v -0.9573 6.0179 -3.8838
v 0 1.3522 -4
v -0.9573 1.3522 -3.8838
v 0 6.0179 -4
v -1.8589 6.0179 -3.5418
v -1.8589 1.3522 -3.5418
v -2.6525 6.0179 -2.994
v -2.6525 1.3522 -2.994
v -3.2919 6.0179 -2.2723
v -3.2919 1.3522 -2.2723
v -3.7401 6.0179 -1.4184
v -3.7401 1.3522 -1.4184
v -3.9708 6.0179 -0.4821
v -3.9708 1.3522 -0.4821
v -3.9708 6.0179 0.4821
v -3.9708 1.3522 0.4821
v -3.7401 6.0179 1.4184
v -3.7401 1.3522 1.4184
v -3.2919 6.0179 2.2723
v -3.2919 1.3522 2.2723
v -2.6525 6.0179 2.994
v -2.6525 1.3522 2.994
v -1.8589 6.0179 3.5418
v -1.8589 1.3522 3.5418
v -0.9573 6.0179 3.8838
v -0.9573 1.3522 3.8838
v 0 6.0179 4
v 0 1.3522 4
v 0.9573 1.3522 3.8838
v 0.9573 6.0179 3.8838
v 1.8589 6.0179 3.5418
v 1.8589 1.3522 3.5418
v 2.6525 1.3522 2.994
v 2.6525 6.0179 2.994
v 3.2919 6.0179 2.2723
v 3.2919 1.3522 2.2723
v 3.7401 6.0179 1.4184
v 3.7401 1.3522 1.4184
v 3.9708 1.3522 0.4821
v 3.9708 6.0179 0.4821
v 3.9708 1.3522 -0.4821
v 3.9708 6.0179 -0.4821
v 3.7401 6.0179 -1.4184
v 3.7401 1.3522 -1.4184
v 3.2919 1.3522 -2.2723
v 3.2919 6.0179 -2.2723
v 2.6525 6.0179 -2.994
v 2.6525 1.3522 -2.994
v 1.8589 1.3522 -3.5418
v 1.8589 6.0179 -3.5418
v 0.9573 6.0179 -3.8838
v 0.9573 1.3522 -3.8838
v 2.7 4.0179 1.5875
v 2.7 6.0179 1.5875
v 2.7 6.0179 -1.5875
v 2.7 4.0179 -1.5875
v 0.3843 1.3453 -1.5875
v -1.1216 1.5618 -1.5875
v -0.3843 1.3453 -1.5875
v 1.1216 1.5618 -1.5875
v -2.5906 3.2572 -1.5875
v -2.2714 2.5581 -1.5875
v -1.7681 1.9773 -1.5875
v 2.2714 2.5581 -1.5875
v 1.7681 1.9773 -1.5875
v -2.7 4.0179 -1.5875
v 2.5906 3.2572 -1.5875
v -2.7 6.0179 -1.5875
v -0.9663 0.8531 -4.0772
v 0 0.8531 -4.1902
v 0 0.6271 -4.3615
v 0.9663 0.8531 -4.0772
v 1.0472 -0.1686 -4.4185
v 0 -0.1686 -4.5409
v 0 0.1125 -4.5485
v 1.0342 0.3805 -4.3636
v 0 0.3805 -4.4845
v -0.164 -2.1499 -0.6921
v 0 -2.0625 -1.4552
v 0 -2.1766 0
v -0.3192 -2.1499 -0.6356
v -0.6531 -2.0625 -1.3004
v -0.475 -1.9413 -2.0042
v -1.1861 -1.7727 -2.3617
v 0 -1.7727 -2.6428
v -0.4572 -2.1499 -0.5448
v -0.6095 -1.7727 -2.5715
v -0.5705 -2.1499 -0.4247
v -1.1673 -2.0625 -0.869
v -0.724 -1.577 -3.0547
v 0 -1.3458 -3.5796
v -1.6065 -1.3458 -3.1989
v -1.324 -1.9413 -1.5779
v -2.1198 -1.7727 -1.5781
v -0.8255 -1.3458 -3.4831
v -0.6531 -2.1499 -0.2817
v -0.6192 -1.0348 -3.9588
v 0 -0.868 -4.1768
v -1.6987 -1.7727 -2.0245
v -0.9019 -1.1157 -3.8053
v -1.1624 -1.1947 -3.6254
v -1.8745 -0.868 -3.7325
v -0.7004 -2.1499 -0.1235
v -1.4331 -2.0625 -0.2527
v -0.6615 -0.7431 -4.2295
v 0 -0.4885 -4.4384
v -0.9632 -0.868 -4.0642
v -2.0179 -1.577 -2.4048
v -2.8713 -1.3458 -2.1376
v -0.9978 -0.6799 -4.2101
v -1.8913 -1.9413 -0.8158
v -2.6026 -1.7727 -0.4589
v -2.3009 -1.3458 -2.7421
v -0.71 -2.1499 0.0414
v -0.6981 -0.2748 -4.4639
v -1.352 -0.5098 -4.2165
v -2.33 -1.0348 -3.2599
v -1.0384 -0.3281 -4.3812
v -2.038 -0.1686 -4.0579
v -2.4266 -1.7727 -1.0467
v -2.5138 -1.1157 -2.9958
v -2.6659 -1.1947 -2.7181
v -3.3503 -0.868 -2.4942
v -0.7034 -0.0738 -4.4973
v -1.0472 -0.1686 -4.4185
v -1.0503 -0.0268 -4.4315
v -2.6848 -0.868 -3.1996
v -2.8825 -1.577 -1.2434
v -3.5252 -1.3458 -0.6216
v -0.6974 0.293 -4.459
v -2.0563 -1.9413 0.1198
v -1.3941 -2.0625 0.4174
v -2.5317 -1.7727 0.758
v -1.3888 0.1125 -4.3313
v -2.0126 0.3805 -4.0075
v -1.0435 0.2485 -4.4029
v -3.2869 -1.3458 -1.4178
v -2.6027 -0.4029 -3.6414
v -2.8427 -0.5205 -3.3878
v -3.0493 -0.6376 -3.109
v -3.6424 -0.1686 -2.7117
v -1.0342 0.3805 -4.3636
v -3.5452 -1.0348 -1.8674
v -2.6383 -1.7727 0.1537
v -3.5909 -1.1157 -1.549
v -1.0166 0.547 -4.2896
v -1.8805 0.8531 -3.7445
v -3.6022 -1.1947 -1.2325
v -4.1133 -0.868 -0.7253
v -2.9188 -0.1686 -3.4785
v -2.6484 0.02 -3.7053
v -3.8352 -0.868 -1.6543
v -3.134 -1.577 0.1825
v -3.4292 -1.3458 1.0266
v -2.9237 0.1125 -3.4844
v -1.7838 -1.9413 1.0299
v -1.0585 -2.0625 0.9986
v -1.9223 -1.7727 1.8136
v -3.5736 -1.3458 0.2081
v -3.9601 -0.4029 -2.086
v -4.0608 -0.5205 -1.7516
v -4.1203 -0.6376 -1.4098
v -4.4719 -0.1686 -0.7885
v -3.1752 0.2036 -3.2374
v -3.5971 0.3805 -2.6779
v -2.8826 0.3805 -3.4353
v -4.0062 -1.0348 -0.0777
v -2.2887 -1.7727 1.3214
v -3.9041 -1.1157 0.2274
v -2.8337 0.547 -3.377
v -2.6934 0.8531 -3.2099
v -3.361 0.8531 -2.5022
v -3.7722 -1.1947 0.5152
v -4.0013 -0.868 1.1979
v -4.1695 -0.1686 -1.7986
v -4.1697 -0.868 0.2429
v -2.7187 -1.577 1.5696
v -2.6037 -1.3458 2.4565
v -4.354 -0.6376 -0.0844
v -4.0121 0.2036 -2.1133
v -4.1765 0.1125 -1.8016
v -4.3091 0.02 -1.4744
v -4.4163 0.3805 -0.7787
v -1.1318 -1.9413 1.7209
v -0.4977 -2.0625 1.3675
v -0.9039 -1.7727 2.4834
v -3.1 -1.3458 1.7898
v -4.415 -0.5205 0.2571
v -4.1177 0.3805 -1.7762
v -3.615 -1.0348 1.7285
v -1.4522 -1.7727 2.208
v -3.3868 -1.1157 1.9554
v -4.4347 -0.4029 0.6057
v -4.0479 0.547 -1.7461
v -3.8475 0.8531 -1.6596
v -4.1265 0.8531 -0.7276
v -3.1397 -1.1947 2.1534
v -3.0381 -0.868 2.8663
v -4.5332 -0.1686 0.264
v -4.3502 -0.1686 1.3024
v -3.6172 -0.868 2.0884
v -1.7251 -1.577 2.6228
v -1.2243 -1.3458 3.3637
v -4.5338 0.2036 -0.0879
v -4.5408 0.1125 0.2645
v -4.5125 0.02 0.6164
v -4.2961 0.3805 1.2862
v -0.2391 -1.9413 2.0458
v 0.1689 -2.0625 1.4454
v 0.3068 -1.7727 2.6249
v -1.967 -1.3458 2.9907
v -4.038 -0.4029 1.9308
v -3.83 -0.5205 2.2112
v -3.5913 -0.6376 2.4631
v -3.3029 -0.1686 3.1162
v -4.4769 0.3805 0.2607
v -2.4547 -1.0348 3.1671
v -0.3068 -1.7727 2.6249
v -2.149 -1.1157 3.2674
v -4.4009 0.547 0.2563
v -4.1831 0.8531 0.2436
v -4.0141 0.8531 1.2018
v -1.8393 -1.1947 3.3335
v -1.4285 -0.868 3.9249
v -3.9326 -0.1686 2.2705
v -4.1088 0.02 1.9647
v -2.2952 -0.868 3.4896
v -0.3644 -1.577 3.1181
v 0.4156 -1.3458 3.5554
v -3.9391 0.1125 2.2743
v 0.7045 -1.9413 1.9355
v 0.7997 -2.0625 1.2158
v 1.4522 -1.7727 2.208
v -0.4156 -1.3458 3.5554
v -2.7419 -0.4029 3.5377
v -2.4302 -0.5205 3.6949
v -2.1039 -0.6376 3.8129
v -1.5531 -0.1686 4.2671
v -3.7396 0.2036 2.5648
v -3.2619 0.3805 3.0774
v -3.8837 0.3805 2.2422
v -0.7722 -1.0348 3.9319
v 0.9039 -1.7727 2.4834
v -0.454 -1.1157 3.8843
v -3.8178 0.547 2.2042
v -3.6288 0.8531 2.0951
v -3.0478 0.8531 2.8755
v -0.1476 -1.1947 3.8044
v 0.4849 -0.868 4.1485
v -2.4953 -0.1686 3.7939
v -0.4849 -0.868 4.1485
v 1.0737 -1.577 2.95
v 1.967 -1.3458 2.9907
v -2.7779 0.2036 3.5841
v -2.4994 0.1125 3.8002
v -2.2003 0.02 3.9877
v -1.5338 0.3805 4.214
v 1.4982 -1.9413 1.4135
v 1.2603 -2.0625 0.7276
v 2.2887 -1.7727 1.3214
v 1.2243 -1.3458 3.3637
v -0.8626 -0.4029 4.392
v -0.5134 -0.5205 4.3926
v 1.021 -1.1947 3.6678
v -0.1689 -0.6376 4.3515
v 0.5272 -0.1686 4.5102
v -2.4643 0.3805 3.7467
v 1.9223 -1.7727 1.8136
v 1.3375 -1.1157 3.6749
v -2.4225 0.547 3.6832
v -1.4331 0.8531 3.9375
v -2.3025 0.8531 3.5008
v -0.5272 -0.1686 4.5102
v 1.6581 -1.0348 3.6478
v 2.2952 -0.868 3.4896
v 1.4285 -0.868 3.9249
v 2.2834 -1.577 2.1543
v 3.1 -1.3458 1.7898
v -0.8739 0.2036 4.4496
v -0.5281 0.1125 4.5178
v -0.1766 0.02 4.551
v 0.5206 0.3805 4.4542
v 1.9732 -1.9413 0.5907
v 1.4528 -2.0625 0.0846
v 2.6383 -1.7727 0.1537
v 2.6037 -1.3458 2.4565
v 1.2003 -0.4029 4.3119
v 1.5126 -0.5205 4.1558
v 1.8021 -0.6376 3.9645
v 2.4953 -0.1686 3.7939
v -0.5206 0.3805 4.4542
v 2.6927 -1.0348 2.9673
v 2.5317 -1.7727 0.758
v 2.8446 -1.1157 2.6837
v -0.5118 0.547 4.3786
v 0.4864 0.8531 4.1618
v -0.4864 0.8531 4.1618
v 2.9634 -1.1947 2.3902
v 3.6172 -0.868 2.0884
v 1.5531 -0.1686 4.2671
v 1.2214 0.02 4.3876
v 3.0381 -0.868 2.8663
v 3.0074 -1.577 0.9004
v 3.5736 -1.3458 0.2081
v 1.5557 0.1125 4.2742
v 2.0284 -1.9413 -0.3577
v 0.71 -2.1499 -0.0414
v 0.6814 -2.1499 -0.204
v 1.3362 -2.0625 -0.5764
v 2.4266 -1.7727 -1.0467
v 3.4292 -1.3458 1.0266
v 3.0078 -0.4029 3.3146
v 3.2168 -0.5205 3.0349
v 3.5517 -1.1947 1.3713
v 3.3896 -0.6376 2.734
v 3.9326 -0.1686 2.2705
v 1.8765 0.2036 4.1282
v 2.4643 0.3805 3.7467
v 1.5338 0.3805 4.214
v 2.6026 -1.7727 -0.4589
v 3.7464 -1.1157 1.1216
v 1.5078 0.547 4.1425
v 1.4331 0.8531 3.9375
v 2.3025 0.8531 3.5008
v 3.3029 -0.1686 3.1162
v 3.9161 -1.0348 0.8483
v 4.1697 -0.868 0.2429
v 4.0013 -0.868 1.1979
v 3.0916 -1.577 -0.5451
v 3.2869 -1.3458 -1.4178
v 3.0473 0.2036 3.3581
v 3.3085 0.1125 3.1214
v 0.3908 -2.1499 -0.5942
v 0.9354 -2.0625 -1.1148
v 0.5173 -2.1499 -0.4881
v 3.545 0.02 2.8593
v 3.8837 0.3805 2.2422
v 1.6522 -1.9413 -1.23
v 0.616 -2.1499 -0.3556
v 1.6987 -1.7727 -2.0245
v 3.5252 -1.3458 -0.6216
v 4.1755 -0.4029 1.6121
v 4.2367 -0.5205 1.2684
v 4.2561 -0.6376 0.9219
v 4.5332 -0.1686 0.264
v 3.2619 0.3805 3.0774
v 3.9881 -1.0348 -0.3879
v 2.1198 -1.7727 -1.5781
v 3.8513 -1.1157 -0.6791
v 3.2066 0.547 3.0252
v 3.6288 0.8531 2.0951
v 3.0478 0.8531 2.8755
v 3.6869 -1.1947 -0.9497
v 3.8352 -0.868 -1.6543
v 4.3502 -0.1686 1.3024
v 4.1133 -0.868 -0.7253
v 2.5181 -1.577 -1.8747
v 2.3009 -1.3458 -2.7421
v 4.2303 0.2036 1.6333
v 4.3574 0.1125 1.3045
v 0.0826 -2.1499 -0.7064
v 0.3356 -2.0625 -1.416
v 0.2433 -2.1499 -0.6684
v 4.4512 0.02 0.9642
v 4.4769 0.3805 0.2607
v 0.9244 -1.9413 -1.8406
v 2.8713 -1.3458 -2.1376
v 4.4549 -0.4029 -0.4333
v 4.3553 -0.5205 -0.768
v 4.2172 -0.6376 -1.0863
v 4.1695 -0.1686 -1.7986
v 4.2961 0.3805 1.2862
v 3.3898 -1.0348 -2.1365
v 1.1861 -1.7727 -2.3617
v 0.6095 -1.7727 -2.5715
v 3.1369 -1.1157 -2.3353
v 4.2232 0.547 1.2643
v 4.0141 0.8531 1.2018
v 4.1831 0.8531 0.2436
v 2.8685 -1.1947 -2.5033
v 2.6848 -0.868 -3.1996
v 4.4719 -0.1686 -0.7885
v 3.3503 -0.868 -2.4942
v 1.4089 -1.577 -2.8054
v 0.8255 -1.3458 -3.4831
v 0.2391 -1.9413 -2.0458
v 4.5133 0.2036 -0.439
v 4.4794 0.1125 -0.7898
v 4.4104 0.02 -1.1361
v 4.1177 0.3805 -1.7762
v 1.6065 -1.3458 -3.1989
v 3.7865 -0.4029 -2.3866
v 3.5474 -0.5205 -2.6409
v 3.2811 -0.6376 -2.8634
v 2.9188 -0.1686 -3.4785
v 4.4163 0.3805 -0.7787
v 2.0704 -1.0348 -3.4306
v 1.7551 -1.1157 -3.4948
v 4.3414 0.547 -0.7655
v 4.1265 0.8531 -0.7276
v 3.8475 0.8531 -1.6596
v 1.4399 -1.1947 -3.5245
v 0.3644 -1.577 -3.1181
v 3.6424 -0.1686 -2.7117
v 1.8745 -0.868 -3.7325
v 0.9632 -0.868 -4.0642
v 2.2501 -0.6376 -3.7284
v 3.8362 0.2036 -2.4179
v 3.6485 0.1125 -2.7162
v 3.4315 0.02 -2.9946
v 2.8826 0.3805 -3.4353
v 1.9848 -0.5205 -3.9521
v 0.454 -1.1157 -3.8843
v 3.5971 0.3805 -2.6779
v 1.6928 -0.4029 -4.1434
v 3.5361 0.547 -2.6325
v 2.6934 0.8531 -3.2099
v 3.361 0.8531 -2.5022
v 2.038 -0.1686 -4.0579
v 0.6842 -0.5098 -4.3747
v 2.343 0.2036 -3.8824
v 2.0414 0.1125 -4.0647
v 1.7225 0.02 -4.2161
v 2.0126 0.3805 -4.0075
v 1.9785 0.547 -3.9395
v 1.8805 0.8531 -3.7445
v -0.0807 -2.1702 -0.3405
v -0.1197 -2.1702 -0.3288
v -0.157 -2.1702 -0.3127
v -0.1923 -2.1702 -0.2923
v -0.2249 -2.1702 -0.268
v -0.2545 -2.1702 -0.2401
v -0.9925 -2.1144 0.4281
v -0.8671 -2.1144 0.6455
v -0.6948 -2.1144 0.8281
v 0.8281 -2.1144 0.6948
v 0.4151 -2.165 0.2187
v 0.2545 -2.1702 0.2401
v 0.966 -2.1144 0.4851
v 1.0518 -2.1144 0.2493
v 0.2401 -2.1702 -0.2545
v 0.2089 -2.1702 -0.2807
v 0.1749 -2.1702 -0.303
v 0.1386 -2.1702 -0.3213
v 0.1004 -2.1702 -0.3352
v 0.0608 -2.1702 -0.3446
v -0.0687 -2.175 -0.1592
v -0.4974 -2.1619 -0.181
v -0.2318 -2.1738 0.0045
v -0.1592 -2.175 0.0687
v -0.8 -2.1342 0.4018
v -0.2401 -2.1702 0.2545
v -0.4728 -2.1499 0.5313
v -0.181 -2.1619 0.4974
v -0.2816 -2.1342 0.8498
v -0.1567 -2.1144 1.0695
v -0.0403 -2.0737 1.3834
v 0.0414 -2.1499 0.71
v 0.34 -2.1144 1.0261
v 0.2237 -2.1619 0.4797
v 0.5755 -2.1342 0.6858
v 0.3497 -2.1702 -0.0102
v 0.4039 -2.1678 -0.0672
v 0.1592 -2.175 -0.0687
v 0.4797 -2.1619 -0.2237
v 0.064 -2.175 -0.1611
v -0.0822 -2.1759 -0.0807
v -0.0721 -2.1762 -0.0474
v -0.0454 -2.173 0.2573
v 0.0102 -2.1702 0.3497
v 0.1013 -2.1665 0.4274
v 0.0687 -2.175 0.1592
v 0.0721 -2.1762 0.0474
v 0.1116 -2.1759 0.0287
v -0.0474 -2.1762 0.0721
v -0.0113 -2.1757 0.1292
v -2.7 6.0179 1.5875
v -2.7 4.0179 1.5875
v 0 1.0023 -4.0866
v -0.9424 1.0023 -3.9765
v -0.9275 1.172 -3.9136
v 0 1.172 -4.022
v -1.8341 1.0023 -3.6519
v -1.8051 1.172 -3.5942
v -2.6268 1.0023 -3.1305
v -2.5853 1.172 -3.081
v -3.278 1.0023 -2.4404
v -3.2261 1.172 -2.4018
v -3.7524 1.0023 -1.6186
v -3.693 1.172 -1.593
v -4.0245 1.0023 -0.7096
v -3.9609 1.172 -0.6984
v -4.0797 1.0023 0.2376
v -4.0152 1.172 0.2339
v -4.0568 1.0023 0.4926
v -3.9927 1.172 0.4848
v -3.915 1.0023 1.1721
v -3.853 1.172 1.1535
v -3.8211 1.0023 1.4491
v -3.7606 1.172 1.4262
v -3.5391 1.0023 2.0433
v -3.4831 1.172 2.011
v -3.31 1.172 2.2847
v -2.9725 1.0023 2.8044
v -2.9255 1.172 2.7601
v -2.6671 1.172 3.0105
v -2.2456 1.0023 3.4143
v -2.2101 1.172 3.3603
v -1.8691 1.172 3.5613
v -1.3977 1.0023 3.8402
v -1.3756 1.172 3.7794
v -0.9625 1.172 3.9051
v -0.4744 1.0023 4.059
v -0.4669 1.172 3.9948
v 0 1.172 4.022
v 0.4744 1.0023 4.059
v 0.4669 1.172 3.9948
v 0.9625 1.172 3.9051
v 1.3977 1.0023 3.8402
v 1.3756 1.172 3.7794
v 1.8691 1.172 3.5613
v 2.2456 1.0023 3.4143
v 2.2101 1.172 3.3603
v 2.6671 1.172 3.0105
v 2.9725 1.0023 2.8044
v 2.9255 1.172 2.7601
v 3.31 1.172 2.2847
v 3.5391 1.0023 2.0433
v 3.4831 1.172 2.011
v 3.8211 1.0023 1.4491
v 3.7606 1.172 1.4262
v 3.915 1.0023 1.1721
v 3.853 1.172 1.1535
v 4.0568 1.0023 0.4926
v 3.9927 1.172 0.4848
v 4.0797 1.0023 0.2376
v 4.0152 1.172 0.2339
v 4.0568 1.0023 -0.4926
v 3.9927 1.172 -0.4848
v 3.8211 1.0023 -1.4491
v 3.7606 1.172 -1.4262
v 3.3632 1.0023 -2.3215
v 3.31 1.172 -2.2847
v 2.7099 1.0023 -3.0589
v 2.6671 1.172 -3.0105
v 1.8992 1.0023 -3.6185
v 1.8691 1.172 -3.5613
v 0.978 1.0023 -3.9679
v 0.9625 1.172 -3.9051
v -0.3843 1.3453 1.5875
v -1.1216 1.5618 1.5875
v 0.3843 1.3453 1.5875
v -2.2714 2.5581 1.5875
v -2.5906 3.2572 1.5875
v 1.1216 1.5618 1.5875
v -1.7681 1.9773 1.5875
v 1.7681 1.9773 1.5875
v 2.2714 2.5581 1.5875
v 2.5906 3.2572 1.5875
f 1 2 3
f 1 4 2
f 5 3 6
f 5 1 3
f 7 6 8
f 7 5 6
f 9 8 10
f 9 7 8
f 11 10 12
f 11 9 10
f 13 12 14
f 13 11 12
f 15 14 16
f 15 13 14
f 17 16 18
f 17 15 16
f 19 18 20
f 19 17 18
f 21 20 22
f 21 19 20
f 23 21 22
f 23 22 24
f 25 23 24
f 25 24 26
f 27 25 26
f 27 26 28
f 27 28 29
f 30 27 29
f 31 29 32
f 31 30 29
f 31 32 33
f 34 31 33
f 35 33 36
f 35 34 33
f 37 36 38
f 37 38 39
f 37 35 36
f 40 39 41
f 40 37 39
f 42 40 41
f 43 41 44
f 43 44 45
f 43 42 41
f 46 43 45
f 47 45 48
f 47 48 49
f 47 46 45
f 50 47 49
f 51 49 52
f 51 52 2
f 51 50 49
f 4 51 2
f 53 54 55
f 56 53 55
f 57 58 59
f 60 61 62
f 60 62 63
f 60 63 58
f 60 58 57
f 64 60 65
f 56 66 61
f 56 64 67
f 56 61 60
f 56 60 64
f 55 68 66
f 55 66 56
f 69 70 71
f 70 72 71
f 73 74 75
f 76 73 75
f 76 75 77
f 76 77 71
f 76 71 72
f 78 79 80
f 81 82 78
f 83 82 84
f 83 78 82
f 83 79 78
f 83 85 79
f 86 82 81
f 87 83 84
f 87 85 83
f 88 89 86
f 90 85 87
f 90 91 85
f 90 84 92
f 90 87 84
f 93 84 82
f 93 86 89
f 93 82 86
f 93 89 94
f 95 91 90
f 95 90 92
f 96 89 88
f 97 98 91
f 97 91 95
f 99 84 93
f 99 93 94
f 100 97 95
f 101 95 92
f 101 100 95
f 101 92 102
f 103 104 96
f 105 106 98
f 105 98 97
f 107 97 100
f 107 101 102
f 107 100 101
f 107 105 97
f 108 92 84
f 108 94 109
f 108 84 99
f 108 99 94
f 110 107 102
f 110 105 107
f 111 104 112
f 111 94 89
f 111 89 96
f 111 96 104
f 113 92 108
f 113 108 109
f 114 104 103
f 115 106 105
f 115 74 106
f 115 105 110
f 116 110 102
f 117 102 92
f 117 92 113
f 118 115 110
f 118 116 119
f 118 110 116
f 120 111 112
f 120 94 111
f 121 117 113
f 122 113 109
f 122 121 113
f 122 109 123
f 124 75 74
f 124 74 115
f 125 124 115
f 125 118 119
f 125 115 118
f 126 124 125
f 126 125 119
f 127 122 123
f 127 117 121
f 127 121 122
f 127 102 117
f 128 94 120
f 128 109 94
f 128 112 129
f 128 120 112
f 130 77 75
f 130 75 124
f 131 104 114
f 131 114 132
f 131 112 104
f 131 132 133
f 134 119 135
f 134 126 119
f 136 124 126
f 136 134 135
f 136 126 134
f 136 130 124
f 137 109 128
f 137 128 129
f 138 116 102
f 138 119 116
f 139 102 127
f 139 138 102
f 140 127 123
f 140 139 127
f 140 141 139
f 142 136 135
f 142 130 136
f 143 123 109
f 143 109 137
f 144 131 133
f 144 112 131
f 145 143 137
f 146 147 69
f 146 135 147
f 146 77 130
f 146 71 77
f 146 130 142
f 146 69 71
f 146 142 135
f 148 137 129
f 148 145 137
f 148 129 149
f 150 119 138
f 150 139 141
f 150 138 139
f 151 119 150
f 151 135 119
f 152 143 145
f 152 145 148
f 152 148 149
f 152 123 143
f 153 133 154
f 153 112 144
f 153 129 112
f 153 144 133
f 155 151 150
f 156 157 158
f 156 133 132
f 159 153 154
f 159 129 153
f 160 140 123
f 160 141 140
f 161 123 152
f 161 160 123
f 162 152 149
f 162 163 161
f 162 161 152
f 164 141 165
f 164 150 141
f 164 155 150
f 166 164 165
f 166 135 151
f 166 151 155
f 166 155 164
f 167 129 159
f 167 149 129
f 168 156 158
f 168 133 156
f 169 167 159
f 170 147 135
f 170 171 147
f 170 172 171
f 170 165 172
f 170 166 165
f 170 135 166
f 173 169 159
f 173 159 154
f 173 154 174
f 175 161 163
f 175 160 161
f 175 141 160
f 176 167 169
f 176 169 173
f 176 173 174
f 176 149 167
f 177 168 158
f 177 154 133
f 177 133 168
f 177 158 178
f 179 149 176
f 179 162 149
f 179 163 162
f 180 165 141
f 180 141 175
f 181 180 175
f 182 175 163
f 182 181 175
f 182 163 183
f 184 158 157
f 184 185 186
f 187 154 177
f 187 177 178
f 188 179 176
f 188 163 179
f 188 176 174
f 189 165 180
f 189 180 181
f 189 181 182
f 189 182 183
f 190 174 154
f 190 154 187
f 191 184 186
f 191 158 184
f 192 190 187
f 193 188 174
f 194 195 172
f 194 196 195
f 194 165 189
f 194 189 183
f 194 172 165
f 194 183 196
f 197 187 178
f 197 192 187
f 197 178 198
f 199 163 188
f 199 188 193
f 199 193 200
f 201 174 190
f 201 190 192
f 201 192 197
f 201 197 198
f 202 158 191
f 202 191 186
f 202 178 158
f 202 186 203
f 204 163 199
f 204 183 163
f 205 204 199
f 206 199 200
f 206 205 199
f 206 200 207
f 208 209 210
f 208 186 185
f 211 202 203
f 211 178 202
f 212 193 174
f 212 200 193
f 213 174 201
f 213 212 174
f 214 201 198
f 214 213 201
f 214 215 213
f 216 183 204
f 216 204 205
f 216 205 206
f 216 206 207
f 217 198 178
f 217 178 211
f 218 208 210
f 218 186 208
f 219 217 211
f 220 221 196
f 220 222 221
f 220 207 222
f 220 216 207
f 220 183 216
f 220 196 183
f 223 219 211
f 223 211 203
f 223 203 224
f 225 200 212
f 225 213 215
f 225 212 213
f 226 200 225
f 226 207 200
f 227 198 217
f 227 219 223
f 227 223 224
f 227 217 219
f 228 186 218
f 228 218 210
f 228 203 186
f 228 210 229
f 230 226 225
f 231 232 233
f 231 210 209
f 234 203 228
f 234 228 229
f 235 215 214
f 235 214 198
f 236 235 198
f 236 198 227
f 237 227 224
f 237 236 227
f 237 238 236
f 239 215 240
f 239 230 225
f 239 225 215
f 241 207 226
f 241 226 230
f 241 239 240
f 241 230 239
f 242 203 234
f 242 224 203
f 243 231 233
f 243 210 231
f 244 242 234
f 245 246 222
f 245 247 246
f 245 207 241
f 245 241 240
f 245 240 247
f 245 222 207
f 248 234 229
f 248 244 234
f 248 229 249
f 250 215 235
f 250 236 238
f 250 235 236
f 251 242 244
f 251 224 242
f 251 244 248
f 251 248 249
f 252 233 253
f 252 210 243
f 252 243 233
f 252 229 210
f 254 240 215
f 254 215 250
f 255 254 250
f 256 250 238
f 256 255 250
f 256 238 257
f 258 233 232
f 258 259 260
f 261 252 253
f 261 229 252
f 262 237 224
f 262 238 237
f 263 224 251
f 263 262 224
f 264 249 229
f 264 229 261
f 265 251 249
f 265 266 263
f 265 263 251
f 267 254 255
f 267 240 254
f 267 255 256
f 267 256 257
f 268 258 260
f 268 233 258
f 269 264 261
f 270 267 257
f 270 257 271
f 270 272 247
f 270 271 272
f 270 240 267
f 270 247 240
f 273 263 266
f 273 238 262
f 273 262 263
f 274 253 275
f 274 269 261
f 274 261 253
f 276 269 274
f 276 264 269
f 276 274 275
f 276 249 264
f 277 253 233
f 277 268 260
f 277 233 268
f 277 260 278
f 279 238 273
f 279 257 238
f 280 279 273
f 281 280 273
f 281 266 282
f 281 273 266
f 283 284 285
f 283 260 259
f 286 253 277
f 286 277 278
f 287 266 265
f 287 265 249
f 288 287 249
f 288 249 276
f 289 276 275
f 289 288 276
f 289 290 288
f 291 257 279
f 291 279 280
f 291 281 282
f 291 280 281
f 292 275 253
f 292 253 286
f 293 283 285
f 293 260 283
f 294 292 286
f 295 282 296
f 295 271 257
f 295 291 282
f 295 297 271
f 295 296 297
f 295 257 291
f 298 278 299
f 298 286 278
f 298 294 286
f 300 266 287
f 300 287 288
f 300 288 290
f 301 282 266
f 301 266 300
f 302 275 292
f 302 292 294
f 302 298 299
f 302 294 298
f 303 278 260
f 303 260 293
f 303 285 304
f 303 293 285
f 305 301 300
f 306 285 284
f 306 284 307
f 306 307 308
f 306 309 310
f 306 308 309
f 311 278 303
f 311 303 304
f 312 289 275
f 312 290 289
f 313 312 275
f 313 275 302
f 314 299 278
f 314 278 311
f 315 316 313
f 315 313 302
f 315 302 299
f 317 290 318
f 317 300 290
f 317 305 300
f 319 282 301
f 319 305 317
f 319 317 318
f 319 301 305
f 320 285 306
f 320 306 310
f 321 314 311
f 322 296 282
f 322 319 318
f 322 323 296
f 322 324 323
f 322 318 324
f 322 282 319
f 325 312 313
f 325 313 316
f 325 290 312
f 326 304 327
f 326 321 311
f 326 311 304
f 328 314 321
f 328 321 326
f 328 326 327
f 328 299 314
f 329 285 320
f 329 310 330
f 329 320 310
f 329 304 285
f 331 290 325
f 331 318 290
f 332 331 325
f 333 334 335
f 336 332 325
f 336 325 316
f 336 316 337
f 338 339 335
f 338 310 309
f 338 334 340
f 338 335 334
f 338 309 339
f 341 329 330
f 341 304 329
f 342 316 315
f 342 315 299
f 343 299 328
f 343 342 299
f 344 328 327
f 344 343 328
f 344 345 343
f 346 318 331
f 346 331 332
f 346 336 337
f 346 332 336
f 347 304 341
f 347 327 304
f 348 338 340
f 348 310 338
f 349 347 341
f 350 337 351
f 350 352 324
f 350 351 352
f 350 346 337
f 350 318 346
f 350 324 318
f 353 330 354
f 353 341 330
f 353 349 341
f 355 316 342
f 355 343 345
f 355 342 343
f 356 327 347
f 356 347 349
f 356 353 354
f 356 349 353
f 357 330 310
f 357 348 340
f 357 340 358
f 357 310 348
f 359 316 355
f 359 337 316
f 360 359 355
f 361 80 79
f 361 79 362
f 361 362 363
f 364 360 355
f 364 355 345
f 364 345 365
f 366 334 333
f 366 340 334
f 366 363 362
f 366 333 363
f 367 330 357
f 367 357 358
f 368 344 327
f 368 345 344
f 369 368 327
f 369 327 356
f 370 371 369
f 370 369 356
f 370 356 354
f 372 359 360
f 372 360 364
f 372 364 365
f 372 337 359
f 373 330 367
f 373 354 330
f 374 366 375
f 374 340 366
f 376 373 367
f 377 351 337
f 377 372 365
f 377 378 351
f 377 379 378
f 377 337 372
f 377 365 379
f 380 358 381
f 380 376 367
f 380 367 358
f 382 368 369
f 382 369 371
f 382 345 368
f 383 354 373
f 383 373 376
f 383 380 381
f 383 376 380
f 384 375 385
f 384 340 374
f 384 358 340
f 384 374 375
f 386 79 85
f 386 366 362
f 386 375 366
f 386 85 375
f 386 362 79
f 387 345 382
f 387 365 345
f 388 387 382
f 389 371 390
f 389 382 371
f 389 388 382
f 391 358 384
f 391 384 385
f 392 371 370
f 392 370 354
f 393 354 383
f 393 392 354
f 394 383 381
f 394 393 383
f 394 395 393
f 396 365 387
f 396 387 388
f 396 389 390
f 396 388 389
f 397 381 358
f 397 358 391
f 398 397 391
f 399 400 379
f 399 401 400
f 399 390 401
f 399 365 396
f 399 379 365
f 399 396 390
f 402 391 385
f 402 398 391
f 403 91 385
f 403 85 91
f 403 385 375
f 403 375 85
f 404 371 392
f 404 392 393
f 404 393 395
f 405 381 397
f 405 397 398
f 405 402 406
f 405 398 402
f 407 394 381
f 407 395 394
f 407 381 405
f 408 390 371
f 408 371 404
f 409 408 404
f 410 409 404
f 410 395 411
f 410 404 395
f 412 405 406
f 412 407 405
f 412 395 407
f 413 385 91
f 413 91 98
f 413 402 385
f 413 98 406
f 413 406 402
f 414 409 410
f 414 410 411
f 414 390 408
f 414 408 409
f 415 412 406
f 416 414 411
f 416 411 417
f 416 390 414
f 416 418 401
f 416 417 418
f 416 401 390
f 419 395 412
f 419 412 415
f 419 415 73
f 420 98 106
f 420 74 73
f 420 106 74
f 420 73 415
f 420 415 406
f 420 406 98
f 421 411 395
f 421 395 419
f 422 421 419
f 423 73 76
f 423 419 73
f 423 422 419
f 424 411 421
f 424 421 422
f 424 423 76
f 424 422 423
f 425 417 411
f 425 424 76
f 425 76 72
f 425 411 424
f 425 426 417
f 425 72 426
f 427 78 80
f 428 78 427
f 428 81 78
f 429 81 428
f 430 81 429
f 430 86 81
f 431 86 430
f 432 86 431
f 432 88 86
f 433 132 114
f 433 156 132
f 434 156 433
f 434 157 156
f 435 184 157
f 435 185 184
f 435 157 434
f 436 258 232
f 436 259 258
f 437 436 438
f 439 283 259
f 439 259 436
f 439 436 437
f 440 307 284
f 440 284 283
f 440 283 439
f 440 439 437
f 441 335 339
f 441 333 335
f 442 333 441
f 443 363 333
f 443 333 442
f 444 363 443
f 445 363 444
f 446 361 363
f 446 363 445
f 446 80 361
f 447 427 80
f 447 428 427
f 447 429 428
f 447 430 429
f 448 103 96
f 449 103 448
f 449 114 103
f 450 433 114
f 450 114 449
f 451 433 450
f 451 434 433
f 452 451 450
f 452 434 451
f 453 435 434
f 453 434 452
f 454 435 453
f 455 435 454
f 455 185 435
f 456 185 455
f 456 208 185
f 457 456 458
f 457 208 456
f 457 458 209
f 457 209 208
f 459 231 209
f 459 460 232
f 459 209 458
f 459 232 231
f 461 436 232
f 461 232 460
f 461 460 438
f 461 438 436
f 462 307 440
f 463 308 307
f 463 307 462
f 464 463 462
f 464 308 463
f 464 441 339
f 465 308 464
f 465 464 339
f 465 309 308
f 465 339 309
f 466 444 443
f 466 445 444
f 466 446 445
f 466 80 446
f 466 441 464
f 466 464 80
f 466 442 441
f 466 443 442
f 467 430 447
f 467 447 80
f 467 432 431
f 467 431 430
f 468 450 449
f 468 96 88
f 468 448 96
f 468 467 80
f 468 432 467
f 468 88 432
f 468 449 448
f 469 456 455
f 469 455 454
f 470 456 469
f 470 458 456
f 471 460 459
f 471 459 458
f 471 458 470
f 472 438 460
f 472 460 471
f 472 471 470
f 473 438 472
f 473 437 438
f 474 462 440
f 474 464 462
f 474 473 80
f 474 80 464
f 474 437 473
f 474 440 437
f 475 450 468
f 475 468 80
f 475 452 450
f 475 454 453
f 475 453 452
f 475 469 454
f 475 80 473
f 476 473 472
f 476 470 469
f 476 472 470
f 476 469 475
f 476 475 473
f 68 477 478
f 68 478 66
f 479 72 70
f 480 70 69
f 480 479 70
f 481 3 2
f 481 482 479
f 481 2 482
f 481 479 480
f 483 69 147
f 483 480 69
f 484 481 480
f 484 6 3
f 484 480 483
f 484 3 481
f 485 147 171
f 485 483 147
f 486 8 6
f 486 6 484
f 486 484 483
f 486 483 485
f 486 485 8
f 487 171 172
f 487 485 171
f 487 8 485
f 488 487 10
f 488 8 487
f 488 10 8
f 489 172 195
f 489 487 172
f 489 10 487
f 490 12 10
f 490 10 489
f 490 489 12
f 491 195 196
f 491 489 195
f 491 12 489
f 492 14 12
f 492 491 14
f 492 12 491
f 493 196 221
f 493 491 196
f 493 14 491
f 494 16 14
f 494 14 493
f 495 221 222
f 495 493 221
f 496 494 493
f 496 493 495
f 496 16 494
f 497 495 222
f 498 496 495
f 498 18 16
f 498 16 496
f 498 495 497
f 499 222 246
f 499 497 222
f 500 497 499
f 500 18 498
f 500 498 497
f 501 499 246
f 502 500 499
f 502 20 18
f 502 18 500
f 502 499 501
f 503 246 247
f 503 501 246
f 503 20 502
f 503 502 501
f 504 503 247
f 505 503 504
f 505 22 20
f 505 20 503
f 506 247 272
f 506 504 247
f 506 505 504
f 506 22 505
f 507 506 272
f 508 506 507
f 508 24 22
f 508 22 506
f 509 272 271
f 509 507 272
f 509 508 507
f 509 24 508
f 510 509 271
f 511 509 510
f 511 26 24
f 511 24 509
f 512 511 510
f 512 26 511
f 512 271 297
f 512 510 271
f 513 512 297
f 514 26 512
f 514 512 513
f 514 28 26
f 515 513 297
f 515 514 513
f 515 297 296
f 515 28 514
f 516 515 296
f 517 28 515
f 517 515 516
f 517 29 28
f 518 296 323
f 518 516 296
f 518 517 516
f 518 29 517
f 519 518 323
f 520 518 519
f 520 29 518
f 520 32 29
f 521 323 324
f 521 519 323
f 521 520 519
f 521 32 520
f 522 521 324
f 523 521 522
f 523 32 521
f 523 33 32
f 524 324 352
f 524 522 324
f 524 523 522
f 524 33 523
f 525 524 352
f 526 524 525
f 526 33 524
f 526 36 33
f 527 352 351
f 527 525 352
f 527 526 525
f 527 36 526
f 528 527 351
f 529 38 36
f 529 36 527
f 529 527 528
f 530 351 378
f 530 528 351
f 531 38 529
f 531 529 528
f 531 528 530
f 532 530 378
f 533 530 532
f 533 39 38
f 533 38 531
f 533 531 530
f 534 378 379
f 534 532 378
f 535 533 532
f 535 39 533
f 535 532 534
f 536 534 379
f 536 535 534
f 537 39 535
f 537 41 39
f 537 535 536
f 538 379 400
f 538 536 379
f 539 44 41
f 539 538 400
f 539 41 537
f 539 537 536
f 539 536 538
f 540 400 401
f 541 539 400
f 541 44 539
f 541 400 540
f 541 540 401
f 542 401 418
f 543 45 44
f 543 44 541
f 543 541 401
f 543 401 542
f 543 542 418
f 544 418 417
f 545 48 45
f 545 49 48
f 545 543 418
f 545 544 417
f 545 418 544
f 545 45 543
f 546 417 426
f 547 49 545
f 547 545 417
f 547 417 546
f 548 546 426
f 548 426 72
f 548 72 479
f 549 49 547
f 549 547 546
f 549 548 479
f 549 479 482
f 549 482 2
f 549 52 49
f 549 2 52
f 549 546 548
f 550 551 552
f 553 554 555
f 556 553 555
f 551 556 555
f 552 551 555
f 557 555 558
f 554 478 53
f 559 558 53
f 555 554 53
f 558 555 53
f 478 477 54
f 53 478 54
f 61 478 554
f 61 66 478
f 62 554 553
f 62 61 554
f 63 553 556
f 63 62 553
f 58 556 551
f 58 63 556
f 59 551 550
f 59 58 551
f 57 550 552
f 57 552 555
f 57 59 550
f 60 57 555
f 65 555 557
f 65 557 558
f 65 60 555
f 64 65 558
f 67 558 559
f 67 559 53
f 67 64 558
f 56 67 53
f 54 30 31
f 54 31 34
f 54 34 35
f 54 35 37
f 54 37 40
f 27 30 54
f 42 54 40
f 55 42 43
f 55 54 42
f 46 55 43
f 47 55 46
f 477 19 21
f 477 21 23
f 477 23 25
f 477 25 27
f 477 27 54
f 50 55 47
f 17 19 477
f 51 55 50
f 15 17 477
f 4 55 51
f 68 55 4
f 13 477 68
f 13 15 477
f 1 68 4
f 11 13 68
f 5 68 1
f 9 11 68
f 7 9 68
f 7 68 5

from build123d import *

# Parameters (mm, degrees)
SKETCH2_W          = 5.4
SKETCH2_H          = 3.175
CUT_EXTRUDE1_DEPTH = 2
SKETCH4_R          = 2.7
CUT_EXTRUDE2_DEPTH = 3.175


with BuildPart() as part:
    # Sketch1 → Revolve3 (revolve)
    with BuildSketch(Plane(origin=(0, 0, 0), x_dir=(0, 0, -1), z_dir=(1, 0, 0))):
        with BuildLine():
            Line((4, 1.352218356), (4, 6.017854764))
            Line((4, 6.017854764), (0, 6.017854764))
            Line((0, 6.017854764), (0, -2.176614275))
            add(Edge.make_bspline(
                [(0, -2.176614275), (6.891187287, -2.176614275), (4.190169576, 0.853129288)],
                knots=[1.570796327, 1.570796327, 1.570796327, 3.544345546, 3.544345546, 3.544345546], degree=2, weights=[1, 0.551383512, 1]))
            ThreePointArc((4.190169576, 0.853129288), (4.049153077, 1.085172309), (4, 1.352218356))
        make_face()
    revolve(axis=Axis((0, 6.017854764, 0), (0, 1, 0)))

    # Sketch2 → Cut-Extrude1 (cut)
    with BuildSketch(Plane(origin=(0, 6.017854764, 0), x_dir=(1, 0, 0), z_dir=(0, 1, 0))):
        Rectangle(SKETCH2_W, SKETCH2_H)
    extrude(amount=-CUT_EXTRUDE1_DEPTH, mode=Mode.SUBTRACT)

    # Sketch4 → Cut-Extrude2 (cut)
    with BuildSketch(Plane.XY.offset(-1.5875)):
        with Locations((0, 4.017854764)):
            Circle(SKETCH4_R)
    extrude(amount=CUT_EXTRUDE2_DEPTH, mode=Mode.SUBTRACT)


solid = part.part
